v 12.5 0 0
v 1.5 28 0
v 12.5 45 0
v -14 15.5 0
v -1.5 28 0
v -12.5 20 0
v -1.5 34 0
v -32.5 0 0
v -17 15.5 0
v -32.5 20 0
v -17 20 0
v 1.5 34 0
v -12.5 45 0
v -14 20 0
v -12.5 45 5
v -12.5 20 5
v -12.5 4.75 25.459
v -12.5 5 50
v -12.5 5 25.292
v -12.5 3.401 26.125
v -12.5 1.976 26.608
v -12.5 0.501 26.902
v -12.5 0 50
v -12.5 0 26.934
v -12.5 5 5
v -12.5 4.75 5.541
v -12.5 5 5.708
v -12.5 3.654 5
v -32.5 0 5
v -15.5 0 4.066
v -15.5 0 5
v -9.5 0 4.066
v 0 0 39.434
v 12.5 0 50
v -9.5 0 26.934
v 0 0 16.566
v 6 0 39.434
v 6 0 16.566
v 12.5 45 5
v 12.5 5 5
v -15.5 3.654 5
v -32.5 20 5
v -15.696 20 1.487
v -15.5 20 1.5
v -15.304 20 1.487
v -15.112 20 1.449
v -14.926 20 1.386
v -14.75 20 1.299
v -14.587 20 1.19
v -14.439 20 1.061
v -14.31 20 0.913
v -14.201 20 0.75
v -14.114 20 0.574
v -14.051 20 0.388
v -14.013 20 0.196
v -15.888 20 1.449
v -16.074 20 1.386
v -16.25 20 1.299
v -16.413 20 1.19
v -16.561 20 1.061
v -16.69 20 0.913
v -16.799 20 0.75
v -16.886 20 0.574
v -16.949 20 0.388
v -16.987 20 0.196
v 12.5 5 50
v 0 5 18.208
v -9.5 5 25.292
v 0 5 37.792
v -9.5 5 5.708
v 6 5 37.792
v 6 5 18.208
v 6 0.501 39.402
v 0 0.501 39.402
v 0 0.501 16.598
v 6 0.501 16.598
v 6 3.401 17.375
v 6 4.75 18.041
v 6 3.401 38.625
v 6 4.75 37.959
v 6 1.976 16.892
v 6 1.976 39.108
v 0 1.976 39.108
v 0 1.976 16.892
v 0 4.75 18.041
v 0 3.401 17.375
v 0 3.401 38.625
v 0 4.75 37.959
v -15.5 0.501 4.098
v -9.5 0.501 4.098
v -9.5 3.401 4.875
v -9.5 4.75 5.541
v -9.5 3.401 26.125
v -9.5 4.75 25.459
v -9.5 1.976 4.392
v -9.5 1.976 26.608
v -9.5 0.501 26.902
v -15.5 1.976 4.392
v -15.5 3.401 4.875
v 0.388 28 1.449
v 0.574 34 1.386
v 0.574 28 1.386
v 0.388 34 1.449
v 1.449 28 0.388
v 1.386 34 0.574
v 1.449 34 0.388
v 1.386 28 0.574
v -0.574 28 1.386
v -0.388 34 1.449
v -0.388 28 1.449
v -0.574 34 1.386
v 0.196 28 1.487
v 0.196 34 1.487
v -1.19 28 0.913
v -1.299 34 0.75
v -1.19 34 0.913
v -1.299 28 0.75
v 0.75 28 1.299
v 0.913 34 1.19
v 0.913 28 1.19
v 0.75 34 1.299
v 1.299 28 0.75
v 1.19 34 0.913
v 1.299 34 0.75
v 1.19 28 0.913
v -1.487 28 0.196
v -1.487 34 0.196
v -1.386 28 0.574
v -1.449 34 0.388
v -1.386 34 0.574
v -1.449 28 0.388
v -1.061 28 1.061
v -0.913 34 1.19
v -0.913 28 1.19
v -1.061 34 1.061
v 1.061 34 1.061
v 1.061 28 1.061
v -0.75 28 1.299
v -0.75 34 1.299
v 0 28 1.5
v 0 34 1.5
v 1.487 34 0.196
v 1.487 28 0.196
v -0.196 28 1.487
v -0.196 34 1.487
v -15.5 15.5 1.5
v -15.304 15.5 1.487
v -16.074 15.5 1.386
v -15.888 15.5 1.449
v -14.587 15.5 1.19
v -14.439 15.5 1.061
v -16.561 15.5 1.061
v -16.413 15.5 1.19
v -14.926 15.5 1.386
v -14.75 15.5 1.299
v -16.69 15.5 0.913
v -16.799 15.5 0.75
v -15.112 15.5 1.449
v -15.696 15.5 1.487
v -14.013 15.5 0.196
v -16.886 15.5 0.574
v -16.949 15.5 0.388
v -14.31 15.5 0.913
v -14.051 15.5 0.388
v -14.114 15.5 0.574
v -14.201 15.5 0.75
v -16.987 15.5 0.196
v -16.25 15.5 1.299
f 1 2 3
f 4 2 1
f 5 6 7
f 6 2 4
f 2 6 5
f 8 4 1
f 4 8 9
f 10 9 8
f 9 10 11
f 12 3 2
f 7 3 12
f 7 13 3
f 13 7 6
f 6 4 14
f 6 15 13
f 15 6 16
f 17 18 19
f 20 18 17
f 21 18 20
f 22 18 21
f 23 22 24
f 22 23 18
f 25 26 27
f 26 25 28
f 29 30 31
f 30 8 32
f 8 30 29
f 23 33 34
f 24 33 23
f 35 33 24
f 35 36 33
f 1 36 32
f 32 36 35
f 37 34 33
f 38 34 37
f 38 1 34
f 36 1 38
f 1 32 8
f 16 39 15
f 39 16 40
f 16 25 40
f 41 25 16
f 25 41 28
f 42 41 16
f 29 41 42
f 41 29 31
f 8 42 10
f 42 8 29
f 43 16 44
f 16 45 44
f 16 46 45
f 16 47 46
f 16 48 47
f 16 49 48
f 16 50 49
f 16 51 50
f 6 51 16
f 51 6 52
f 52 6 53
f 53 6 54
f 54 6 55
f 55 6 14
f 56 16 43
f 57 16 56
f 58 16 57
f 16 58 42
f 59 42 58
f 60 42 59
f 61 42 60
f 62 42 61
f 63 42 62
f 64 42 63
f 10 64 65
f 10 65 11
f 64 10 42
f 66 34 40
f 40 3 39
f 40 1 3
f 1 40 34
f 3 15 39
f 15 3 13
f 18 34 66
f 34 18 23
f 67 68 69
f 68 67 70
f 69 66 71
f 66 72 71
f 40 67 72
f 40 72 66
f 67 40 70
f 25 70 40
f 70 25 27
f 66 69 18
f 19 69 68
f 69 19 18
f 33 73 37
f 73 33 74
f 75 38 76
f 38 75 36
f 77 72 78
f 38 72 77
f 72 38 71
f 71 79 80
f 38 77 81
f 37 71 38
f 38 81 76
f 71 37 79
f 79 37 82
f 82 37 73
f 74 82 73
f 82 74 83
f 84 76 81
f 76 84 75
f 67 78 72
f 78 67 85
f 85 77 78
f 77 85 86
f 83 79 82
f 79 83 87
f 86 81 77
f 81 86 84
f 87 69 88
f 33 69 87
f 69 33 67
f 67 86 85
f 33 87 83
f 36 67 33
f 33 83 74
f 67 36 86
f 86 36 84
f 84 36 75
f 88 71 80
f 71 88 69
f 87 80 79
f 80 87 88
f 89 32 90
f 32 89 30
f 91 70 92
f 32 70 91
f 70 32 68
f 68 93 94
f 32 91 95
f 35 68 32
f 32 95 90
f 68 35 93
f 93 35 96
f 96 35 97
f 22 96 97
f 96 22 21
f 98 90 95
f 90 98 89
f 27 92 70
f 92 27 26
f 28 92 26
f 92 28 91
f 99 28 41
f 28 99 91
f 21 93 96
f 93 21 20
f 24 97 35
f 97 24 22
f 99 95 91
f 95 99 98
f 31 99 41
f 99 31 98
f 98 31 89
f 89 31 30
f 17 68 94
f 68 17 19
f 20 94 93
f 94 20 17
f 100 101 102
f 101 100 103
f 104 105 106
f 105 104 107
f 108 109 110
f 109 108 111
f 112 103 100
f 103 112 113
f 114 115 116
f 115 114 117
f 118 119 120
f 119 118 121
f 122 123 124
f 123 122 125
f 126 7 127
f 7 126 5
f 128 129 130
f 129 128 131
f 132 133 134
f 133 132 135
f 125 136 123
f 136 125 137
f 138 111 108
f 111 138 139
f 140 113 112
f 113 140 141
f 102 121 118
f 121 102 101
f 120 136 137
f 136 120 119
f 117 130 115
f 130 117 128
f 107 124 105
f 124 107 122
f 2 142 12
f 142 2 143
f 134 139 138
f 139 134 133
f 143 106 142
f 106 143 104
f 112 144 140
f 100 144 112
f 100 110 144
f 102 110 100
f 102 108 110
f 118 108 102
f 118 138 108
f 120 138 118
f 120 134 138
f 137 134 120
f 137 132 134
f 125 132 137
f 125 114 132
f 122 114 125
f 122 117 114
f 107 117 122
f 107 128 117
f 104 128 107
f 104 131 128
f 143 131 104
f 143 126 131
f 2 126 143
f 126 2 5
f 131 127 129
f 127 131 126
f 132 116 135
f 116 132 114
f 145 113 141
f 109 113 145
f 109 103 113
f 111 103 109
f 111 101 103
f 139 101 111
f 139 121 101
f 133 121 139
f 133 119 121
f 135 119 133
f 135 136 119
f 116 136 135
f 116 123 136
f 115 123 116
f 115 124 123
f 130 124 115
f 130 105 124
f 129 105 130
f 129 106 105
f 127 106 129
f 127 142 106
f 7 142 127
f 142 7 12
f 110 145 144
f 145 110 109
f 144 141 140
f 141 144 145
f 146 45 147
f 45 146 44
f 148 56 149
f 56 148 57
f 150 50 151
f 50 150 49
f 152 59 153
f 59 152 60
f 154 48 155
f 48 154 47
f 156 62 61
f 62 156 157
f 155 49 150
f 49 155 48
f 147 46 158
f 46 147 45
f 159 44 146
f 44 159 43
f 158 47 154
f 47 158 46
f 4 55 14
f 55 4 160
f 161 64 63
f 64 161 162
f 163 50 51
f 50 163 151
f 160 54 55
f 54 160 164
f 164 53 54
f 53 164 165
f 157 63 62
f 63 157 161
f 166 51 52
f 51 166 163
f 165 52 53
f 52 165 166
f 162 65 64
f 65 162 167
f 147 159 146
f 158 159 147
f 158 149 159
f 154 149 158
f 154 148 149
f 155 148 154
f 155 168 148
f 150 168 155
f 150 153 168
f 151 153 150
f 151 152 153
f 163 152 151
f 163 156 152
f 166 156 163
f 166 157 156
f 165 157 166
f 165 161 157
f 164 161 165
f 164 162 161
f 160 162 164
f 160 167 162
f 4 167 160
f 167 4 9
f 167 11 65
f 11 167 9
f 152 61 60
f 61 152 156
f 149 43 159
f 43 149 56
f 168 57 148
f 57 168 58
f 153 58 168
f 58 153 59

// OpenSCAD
// L-shaped mounting bracket for a NEMA 17 stepper motor (e.g. syringe pump).
// Base plate with two vertical through-holes; vertical motor plate with a
// motor-centring boss hole and a 3 mm screw pattern; two triangular gussets
// at the edges. NOVEL general part.
//

base_x   = 25;
base_y   = 45;
base_z   = 5;
screw_h  = 4.5;
motor_y  = 5;
motor_z  = 50;
boss_h   = 23;
screw_p  = 31;
gusset_t = 5;
gusset_l = 20;
gusset_w = 20;

$fn = 48;

base_holes = [
    [-17, 30],
    [17, 30]
];

motor_holes = [
    [0, 28],                 // boss - a hole for the motor's centring boss
    [-15.5, 15.5],
    [-15.5, -15.5],
    [15.5, 15.5],
    [15.5, -15.5]
];

difference() {
    union() {
        translate([-base_x / 2, 0, 0]) cube([base_x, base_y, base_z]);                 // base plate
        translate([-base_x / 2, 0, 0]) cube([base_x, motor_y, motor_z]);               // motor plate
        for (x = [-base_x / 2, base_x / 2])
            translate([x, 0, 0])
                linear_extrude(motor_y)
                    polygon([[-gusset_l, gusset_w], [-gusset_l, 0], [0, 0], [0, gusset_w]]);  // gussets
    }
    for (p = base_holes)
        translate(p) cylinder(h = base_z + 1, d = screw_h);                      // base through-holes
    for (p = motor_holes)
        translate([p[0], -1, p[1]]) rotate([0, 90, 0]) cylinder(h = motor_y + 1, d = boss_h);   // motor holes
    for (p = motor_holes)
        translate(p) rotate([-90, 0, 0]) cylinder(h = motor_y + 1, d = 3);       // screw holes
}
